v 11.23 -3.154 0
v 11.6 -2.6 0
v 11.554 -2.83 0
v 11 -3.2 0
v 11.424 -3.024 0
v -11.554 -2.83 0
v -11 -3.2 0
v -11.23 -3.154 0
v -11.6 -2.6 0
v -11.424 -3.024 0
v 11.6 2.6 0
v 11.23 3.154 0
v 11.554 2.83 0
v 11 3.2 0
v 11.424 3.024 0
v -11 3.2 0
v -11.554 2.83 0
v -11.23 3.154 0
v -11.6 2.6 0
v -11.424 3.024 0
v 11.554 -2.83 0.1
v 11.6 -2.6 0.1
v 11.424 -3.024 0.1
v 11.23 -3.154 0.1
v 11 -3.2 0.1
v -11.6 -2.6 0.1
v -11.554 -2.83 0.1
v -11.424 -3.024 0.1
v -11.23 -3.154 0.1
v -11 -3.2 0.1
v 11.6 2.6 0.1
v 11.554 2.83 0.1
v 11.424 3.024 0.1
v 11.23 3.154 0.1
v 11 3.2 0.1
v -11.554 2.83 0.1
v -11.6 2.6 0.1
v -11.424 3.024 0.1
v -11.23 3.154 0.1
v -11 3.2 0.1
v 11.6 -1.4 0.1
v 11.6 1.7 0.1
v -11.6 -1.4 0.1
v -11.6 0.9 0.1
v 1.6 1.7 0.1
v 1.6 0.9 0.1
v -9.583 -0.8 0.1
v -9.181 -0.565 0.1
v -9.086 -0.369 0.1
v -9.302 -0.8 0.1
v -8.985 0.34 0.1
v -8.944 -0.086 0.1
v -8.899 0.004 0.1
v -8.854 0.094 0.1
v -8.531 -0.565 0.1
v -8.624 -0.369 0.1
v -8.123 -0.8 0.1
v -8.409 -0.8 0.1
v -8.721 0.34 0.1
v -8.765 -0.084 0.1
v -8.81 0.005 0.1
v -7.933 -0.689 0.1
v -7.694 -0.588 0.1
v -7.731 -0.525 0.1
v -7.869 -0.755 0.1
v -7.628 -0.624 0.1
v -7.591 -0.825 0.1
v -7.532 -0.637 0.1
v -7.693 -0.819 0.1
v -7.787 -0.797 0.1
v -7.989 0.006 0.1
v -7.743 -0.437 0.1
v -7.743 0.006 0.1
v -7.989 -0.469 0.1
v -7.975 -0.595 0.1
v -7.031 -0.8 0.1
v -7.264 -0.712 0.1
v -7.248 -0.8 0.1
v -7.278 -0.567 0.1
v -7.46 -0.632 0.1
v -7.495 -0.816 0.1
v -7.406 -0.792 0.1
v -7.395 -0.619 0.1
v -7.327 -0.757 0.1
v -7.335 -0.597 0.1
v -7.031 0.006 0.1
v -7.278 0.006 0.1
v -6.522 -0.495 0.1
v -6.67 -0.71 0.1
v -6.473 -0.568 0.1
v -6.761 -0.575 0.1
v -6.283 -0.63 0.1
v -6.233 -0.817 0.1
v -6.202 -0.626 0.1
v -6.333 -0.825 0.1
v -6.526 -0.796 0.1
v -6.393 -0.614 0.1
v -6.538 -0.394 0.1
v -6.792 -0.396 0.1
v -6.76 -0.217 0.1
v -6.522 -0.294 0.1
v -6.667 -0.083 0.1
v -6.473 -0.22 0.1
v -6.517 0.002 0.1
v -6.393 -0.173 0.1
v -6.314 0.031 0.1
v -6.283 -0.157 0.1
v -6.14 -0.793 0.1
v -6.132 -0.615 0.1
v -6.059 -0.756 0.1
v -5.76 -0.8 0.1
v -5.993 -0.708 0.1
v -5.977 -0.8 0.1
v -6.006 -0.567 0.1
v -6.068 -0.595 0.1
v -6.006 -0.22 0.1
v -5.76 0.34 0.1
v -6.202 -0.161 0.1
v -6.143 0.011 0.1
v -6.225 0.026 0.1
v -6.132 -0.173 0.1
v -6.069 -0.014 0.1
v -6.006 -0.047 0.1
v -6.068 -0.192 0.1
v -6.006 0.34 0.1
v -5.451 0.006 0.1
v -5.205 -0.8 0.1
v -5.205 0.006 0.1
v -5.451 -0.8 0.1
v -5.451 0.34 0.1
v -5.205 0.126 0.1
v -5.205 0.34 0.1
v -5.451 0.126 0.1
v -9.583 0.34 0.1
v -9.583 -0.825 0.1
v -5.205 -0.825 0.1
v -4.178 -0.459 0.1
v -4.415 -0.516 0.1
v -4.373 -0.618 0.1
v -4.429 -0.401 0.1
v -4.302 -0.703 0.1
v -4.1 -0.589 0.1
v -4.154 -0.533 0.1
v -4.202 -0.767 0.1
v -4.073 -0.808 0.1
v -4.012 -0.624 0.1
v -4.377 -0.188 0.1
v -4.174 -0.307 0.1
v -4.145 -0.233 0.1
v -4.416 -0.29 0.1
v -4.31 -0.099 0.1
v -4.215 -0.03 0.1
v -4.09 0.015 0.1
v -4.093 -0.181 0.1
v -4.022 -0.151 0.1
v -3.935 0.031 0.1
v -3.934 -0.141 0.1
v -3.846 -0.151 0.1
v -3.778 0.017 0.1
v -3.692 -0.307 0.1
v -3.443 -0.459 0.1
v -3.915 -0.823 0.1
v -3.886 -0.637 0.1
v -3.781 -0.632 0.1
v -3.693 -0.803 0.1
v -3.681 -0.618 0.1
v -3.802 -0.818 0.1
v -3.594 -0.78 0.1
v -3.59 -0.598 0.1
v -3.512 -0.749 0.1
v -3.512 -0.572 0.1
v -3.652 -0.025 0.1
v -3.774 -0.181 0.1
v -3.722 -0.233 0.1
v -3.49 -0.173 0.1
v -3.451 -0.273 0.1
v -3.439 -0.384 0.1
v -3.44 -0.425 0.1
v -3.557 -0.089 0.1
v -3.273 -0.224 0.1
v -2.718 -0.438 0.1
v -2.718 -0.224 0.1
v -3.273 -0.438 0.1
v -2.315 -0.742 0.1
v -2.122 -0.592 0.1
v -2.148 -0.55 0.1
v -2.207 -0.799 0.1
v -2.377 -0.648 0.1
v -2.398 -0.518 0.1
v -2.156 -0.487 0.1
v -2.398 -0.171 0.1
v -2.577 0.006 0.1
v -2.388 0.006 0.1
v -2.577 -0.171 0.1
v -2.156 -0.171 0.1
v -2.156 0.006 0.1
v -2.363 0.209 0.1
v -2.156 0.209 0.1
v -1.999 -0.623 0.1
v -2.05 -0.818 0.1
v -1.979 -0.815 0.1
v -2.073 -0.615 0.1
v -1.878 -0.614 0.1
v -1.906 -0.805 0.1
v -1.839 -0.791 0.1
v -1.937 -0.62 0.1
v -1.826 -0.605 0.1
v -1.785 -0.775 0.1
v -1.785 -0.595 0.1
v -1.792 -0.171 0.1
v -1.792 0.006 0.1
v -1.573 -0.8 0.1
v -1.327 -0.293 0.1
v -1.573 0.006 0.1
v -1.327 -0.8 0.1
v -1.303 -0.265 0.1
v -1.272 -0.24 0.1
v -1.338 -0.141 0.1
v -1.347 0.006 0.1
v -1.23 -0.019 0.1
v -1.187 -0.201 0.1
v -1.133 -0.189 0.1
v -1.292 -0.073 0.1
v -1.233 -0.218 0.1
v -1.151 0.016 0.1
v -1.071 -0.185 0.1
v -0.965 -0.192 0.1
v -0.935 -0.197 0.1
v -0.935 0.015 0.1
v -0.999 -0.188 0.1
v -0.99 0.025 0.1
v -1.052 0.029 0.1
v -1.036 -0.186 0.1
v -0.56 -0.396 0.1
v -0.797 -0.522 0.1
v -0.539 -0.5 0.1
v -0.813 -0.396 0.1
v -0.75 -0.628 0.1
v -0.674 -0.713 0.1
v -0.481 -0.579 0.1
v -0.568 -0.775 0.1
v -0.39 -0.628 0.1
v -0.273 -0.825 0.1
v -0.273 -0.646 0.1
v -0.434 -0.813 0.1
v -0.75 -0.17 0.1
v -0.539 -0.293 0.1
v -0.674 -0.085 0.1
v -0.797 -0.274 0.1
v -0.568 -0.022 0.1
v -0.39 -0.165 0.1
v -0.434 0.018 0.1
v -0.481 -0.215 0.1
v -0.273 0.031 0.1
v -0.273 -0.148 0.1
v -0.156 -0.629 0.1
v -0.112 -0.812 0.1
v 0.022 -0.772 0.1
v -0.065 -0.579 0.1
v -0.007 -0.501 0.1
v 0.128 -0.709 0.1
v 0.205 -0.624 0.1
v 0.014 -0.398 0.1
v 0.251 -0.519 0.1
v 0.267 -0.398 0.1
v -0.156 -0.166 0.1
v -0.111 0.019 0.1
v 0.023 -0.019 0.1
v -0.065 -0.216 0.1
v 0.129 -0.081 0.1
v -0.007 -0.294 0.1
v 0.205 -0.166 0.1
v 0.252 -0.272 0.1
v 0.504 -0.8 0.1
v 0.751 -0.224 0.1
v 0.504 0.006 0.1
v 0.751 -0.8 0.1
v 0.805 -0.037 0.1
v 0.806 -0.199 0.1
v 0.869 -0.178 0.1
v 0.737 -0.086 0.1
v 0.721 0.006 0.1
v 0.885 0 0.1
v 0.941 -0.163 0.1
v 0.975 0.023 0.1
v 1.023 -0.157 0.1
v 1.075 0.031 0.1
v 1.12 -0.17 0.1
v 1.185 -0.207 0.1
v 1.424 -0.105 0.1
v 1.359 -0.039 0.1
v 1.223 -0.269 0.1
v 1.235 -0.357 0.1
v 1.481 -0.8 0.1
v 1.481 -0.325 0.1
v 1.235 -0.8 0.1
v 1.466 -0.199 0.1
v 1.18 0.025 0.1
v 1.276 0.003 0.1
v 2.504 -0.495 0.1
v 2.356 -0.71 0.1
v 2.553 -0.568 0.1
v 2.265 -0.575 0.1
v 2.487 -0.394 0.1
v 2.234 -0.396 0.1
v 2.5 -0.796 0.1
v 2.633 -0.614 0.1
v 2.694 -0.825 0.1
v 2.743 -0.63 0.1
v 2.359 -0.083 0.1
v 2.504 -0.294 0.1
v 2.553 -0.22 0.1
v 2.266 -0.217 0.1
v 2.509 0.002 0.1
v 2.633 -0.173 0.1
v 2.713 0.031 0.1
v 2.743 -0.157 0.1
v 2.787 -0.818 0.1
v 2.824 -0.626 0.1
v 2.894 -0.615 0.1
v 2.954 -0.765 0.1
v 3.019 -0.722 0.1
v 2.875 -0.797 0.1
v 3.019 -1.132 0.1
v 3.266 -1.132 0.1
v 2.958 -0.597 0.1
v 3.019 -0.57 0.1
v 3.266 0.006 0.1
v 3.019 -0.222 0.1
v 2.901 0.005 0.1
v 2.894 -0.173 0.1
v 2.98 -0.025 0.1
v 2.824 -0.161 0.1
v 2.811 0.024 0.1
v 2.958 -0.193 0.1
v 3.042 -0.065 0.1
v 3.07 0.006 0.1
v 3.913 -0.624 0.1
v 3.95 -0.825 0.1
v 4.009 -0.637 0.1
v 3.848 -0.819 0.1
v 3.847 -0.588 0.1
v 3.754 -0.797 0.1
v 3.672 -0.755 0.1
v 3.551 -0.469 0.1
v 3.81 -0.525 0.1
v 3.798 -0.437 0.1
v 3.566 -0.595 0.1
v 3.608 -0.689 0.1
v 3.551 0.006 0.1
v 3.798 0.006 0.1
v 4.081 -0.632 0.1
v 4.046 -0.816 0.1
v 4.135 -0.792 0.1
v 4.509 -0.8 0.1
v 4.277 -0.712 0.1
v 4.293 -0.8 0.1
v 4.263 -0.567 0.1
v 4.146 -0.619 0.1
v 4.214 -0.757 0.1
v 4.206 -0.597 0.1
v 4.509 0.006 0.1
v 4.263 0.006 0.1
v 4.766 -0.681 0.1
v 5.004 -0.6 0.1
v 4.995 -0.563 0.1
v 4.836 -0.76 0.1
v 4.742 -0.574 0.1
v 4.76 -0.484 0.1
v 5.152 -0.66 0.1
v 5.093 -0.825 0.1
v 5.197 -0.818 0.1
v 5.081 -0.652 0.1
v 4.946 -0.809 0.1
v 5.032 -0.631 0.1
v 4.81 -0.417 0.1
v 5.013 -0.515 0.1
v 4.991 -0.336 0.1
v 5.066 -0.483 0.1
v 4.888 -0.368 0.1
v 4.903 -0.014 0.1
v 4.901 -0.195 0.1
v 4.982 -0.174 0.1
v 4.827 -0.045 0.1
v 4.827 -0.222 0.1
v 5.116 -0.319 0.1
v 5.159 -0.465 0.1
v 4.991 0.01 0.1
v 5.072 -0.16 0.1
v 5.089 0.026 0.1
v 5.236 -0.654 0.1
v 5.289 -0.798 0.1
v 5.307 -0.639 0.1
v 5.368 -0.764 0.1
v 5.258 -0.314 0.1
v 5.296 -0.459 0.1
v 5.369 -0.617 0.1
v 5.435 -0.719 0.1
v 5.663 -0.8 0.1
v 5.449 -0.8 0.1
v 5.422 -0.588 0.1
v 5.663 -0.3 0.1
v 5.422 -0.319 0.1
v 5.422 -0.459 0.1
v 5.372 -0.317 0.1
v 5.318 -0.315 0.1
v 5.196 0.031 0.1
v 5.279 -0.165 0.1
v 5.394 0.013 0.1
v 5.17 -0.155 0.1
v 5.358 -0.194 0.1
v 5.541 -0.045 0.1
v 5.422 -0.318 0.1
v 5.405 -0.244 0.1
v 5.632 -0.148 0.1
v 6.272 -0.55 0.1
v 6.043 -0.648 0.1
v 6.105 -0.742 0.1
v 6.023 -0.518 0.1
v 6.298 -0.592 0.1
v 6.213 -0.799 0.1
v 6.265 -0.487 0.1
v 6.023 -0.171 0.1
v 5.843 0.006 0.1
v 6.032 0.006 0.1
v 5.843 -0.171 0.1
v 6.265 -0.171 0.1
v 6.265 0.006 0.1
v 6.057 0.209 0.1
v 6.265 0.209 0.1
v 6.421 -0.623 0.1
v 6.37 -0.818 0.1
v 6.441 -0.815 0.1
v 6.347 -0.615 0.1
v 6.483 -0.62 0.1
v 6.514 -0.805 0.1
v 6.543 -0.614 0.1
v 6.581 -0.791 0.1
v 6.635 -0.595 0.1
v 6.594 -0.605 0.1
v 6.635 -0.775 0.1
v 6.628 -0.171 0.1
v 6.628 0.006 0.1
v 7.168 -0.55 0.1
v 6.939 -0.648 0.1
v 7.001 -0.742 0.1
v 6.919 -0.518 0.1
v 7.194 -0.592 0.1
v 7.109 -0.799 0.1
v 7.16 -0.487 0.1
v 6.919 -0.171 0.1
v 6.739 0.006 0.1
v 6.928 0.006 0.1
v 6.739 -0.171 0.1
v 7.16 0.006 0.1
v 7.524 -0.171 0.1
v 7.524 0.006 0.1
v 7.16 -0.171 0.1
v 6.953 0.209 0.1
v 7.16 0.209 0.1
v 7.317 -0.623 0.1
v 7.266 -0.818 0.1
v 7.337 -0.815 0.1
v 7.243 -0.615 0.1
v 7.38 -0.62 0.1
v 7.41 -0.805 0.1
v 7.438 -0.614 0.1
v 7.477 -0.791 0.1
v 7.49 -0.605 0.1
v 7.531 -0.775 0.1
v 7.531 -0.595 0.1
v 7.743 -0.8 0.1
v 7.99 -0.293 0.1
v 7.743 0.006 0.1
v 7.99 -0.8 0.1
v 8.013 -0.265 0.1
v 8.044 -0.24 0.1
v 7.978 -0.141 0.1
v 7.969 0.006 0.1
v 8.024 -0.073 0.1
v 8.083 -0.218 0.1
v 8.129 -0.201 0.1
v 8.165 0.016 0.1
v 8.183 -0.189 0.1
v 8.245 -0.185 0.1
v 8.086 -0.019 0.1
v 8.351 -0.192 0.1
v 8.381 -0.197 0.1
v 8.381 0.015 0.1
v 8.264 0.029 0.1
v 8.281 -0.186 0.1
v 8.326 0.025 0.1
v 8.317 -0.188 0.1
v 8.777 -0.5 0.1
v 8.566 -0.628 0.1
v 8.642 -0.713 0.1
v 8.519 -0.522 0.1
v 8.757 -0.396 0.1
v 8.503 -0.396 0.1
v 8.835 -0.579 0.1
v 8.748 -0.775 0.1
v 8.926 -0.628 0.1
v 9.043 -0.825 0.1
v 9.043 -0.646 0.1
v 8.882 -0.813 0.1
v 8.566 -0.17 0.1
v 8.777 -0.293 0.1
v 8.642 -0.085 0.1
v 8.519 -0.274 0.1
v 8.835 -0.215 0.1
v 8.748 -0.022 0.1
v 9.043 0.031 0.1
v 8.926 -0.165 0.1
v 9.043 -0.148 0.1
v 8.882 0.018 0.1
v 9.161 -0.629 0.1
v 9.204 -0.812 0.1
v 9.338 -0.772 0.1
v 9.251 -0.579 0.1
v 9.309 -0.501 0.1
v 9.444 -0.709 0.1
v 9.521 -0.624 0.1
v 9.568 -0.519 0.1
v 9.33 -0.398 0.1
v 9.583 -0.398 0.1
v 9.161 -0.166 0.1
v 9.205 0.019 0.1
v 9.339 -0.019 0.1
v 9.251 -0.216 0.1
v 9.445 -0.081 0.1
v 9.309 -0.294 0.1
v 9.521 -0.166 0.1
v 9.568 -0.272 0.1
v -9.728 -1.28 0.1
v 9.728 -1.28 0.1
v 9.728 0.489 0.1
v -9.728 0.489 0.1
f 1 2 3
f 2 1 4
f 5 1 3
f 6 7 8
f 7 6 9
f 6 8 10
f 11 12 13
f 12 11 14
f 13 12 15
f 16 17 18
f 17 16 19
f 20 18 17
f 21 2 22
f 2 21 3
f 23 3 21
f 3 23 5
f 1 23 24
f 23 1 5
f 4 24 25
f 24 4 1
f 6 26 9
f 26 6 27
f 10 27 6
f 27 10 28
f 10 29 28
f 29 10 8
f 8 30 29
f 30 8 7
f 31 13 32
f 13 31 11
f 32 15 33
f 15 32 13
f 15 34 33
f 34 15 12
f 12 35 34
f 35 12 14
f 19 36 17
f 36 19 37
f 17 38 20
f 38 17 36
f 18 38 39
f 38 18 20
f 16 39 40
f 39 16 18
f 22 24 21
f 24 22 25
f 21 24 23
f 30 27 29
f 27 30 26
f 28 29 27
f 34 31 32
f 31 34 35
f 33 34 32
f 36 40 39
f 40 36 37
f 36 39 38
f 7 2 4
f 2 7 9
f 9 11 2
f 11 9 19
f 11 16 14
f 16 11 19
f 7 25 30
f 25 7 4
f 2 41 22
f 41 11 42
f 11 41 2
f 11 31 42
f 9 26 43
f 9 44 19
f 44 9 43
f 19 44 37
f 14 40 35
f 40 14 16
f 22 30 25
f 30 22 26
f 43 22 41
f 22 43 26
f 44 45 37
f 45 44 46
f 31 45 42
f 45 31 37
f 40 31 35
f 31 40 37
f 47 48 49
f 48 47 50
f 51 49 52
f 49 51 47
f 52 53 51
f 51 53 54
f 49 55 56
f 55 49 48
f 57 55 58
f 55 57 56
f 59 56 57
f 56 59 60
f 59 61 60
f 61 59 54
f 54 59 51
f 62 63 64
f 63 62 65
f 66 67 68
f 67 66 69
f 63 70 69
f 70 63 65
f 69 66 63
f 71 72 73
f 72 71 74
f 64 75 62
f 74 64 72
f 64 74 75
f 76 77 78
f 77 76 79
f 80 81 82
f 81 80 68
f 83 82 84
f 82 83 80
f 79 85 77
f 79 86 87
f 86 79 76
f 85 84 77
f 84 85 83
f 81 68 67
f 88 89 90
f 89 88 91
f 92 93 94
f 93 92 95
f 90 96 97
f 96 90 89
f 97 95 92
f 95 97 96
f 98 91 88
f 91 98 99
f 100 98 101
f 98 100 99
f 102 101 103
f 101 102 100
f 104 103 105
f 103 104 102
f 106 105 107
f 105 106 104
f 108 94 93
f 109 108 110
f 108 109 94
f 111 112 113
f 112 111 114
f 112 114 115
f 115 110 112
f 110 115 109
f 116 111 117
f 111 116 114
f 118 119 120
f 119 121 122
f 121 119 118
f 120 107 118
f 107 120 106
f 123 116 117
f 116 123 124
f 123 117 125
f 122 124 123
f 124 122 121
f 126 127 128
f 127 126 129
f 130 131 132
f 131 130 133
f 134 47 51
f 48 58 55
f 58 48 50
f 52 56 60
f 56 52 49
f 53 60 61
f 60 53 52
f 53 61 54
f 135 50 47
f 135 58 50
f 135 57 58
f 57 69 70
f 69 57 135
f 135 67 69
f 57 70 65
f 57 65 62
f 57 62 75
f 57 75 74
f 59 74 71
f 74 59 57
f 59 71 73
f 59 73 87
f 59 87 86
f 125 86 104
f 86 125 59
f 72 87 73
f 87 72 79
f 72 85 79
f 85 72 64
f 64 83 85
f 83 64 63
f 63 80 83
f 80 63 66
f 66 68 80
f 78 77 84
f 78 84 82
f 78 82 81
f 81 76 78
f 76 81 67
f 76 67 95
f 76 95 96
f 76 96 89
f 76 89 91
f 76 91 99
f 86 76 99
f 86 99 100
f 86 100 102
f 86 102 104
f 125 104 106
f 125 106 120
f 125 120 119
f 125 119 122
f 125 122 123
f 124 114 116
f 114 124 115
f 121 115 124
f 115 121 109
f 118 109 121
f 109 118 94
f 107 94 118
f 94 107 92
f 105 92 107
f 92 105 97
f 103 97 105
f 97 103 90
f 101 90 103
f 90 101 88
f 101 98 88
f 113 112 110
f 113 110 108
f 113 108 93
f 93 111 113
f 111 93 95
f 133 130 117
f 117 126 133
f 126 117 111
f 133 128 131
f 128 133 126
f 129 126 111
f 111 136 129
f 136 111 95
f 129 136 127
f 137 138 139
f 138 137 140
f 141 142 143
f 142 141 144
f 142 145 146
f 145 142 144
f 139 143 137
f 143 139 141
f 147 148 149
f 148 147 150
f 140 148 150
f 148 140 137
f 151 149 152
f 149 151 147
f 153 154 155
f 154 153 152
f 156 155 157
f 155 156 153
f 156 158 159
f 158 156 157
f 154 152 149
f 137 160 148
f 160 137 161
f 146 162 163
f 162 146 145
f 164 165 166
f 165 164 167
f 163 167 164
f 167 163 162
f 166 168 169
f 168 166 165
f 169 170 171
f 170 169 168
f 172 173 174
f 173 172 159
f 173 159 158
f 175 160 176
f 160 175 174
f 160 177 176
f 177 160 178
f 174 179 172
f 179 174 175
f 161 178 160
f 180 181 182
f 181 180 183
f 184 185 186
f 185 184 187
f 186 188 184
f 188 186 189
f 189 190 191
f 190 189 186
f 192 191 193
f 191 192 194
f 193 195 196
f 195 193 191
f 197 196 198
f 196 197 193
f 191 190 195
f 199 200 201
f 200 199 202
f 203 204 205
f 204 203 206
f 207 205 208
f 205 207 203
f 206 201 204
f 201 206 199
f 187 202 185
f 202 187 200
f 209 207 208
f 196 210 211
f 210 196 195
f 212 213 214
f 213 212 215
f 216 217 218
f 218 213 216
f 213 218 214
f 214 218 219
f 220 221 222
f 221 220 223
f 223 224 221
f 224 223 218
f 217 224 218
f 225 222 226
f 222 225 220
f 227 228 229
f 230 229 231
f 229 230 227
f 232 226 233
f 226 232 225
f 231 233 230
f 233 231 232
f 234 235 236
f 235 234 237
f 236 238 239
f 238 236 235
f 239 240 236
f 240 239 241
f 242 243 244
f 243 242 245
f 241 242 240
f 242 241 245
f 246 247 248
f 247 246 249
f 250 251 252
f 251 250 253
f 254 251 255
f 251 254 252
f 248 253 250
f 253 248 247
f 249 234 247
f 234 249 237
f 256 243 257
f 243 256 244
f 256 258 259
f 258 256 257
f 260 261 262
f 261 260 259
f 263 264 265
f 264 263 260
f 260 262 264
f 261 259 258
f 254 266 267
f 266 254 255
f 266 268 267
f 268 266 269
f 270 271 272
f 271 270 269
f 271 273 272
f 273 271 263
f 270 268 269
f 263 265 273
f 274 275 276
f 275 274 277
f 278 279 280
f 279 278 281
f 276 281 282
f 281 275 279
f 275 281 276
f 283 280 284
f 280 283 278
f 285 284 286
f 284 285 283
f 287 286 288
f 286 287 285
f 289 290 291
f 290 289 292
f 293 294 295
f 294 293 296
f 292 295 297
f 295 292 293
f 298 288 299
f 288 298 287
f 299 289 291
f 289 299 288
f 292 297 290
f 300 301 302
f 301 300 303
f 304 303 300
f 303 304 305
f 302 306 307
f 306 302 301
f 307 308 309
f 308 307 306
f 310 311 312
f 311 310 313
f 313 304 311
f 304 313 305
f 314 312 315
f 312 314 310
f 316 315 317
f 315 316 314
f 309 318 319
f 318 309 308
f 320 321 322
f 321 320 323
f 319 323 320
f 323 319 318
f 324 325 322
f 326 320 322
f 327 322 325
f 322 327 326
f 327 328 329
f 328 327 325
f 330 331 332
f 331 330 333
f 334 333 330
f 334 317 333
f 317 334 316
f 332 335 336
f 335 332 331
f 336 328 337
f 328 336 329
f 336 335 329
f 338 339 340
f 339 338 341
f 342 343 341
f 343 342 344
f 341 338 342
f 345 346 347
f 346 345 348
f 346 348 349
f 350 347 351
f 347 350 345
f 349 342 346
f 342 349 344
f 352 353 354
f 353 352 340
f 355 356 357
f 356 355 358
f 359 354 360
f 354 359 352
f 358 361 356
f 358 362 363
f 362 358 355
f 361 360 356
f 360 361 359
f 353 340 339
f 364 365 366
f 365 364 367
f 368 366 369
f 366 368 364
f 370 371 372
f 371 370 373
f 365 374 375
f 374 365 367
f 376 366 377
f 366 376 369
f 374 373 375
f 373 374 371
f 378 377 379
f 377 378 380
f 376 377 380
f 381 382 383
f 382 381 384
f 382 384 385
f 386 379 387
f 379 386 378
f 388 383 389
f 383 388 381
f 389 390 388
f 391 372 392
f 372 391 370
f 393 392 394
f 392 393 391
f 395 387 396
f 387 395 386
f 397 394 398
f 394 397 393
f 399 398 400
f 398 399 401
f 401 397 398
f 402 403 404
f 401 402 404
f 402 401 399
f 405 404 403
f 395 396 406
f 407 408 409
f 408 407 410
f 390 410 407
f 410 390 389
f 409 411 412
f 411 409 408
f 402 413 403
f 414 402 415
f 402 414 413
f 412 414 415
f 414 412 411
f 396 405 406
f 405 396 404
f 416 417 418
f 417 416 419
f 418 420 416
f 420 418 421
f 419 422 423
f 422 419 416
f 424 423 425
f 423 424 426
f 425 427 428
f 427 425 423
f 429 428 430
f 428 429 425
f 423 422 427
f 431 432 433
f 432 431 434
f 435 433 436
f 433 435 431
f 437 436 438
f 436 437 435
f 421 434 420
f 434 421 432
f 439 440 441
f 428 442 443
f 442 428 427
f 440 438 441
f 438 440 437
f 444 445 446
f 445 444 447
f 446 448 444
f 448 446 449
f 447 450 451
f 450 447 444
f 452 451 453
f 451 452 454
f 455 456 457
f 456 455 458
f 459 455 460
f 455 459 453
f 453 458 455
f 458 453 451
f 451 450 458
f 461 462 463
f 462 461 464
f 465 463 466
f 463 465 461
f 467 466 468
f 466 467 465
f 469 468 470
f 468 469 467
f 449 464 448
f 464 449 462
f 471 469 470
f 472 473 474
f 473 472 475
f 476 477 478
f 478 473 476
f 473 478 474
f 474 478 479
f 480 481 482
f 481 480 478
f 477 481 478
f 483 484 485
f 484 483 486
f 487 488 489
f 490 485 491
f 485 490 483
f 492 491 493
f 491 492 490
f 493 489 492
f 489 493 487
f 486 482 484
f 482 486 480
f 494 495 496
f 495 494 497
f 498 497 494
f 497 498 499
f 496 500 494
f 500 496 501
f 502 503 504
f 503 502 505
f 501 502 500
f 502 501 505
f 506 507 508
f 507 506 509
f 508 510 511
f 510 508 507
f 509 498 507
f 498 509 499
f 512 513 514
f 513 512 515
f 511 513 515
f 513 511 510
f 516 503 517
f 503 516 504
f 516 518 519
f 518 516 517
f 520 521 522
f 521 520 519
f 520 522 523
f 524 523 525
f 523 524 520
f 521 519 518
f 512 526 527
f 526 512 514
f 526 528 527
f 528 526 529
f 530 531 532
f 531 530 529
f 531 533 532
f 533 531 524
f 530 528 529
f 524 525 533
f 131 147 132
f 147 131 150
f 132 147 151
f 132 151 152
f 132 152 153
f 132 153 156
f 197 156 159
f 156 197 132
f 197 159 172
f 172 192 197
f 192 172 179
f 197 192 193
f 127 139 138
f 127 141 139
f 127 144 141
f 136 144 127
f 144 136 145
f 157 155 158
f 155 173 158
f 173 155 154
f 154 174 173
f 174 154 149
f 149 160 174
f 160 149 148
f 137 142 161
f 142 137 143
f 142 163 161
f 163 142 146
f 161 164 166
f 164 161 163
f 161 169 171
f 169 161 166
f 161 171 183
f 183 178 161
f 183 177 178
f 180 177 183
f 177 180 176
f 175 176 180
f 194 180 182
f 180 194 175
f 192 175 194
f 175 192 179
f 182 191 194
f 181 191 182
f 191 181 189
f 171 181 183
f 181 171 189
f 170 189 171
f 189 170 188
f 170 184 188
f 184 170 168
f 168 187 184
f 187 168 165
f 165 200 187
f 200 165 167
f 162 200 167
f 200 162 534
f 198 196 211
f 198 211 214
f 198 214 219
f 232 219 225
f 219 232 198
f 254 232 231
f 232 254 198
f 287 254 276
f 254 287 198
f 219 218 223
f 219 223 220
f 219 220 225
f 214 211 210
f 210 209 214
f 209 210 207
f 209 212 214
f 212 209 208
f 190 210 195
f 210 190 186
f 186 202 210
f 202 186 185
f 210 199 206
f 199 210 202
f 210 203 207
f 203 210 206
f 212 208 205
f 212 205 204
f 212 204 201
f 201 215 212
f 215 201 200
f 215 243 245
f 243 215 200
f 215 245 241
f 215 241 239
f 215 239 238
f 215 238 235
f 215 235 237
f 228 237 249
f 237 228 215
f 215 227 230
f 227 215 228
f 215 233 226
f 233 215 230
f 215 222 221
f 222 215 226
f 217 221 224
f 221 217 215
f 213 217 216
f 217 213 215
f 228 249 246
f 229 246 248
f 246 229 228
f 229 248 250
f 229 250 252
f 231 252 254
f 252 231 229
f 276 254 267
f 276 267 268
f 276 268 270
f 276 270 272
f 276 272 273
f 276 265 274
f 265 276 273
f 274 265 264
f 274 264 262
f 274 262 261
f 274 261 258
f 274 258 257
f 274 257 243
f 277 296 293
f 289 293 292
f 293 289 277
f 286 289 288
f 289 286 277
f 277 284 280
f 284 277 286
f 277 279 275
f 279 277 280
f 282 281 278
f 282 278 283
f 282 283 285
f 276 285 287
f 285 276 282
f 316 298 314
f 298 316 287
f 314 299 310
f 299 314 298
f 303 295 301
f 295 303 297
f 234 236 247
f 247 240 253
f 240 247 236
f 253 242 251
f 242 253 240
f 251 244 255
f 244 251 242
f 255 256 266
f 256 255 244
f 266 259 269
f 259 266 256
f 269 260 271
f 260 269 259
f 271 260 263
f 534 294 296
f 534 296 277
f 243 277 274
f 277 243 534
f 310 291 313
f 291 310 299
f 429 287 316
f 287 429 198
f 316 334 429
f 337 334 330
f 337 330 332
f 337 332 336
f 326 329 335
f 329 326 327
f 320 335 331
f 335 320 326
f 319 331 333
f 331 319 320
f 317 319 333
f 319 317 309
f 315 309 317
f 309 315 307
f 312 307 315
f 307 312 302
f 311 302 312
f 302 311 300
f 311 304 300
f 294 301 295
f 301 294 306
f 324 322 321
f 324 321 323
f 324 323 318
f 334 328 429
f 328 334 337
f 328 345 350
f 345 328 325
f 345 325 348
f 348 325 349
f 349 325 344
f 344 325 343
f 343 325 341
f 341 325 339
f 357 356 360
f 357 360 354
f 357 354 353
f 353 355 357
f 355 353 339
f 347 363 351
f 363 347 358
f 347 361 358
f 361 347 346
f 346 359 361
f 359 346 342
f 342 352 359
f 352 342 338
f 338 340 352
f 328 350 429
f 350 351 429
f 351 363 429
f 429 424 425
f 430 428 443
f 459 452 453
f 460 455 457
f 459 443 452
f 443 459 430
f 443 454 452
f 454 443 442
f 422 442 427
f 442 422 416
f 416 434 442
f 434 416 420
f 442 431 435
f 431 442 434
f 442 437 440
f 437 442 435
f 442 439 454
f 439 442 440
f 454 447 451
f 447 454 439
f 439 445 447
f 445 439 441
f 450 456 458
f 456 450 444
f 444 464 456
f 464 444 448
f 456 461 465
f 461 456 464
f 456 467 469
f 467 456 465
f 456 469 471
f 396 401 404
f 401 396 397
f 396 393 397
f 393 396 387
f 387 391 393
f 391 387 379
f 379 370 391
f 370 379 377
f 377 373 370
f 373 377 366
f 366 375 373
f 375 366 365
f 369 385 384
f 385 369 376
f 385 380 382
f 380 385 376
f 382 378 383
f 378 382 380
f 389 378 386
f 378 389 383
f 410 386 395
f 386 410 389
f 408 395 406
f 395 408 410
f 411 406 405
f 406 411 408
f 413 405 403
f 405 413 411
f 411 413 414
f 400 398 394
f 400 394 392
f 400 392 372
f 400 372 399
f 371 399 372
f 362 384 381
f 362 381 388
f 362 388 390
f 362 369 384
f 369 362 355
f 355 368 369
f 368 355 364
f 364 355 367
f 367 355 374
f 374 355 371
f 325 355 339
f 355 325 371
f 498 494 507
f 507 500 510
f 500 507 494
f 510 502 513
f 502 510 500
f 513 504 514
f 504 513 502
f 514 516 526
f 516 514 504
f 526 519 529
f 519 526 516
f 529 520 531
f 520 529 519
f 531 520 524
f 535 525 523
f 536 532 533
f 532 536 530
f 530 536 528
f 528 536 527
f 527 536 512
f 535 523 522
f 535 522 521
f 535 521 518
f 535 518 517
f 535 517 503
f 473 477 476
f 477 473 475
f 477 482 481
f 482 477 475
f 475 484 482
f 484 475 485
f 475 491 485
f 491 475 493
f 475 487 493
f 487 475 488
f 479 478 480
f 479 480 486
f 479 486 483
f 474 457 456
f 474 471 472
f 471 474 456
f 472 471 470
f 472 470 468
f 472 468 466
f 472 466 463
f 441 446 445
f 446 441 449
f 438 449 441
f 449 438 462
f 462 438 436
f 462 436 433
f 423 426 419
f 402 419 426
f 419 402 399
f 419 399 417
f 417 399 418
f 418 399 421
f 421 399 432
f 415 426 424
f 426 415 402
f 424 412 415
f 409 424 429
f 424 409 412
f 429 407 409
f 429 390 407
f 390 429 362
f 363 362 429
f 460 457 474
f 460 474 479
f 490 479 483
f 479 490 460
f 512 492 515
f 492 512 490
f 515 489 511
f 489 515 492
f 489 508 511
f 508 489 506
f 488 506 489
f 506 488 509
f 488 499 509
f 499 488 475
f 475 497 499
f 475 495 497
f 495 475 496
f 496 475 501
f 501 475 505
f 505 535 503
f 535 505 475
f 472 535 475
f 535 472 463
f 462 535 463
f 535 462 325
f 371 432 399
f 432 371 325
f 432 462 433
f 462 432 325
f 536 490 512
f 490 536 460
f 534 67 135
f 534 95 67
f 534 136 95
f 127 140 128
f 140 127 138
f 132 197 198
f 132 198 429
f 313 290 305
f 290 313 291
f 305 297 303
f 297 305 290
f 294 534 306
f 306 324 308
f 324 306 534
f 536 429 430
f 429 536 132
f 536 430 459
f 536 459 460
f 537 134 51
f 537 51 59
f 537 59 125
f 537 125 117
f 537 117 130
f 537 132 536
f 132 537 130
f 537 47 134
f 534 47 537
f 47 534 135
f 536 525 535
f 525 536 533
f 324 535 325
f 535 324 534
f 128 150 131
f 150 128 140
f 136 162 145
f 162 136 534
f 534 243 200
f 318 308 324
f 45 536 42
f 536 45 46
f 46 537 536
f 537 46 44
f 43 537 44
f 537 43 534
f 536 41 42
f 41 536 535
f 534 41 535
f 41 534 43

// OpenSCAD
use <../lib.scad>
use <s/6142275us01.scad>
use <s/6142275us02.scad>
function ldraw_lib__6142275v() = [
// 0 Sticker  0.8 x  5.8 with Red Stripe with "Audi e-tron quattro" White Text on Black Background Right
// 0 Name: 6142275v.dat
// 0 Author: Massimo Maso [Sirio]
// 0 !LDRAW_ORG Part UPDATE 2024-11
// 0 !LICENSE Licensed under CC BY 4.0 : see CAreadme.txt
// 
// 0 BFC CERTIFY CCW
  [0,"BFC","CERTIFY"],
  [0,"BFC","CCW"],
// 
// 0 !KEYWORDS Bricklink 75872stk01, Brickowl 776565, R18, Rebrickable 24752
// 0 !KEYWORDS Set 75872, Speed Champions
// 
// 0 !HISTORY 2024-12-30 [OrionP] Official Update 2024-11
// 
// 
// 0 // Subparts
// 1 16 0 0 0 -1 0 0 0 1 0 0 0 -1 s\6142275us01.dat
  [1,16,0,0,0,-1,0,0,0,1,0,0,0,-1, ldraw_lib__s__6142275us01()],
// 1 4 0 -.25 -.9896 .3685 0 0 0 1 0 0 0 .3685 s\6142275us02.dat
  [1,4,0,-.25,-.9896,.3685,0,0,0,1,0,0,0,.3685, ldraw_lib__s__6142275us02()],
// 0 // Top red faces
// 4 4 4 -.25 4.25 4 -.25 2.25 24.321 -.25 1.2214 29 -.25 4.25
  [4,4,4,-.25,4.25,4,-.25,2.25,24.321,-.25,1.2214,29,-.25,4.25],
// 4 4 -29 -.25 2.25 -24.321 -.25 1.2214 24.321 -.25 1.2214 4 -.25 2.25
  [4,4,-29,-.25,2.25,-24.321,-.25,1.2214,24.321,-.25,1.2214,4,-.25,2.25],
// 4 4 -29 -.25 2.25 -29 -.25 -3.5 -24.321 -.25 -3.2006 -24.321 -.25 1.2214
  [4,4,-29,-.25,2.25,-29,-.25,-3.5,-24.321,-.25,-3.2006,-24.321,-.25,1.2214],
// 4 4 29 -.25 4.25 24.321 -.25 1.2214 24.321 -.25 -3.2006 29 -.25 -3.5
  [4,4,29,-.25,4.25,24.321,-.25,1.2214,24.321,-.25,-3.2006,29,-.25,-3.5],
// 4 4 -24.321 -.25 -3.2006 -29 -.25 -3.5 29 -.25 -3.5 24.321 -.25 -3.2006
  [4,4,-24.321,-.25,-3.2006,-29,-.25,-3.5,29,-.25,-3.5,24.321,-.25,-3.2006],
];
module ldraw_lib__6142275v(step=0, col=false, unit=2/5, alt=false, line=0.2, solid=!$preview)
    makepoly(ldraw_lib__6142275v(), step=step, col=col, unit=unit, alt=alt, line=line, solid=solid);
ldraw_lib__6142275v(line=0.2);
